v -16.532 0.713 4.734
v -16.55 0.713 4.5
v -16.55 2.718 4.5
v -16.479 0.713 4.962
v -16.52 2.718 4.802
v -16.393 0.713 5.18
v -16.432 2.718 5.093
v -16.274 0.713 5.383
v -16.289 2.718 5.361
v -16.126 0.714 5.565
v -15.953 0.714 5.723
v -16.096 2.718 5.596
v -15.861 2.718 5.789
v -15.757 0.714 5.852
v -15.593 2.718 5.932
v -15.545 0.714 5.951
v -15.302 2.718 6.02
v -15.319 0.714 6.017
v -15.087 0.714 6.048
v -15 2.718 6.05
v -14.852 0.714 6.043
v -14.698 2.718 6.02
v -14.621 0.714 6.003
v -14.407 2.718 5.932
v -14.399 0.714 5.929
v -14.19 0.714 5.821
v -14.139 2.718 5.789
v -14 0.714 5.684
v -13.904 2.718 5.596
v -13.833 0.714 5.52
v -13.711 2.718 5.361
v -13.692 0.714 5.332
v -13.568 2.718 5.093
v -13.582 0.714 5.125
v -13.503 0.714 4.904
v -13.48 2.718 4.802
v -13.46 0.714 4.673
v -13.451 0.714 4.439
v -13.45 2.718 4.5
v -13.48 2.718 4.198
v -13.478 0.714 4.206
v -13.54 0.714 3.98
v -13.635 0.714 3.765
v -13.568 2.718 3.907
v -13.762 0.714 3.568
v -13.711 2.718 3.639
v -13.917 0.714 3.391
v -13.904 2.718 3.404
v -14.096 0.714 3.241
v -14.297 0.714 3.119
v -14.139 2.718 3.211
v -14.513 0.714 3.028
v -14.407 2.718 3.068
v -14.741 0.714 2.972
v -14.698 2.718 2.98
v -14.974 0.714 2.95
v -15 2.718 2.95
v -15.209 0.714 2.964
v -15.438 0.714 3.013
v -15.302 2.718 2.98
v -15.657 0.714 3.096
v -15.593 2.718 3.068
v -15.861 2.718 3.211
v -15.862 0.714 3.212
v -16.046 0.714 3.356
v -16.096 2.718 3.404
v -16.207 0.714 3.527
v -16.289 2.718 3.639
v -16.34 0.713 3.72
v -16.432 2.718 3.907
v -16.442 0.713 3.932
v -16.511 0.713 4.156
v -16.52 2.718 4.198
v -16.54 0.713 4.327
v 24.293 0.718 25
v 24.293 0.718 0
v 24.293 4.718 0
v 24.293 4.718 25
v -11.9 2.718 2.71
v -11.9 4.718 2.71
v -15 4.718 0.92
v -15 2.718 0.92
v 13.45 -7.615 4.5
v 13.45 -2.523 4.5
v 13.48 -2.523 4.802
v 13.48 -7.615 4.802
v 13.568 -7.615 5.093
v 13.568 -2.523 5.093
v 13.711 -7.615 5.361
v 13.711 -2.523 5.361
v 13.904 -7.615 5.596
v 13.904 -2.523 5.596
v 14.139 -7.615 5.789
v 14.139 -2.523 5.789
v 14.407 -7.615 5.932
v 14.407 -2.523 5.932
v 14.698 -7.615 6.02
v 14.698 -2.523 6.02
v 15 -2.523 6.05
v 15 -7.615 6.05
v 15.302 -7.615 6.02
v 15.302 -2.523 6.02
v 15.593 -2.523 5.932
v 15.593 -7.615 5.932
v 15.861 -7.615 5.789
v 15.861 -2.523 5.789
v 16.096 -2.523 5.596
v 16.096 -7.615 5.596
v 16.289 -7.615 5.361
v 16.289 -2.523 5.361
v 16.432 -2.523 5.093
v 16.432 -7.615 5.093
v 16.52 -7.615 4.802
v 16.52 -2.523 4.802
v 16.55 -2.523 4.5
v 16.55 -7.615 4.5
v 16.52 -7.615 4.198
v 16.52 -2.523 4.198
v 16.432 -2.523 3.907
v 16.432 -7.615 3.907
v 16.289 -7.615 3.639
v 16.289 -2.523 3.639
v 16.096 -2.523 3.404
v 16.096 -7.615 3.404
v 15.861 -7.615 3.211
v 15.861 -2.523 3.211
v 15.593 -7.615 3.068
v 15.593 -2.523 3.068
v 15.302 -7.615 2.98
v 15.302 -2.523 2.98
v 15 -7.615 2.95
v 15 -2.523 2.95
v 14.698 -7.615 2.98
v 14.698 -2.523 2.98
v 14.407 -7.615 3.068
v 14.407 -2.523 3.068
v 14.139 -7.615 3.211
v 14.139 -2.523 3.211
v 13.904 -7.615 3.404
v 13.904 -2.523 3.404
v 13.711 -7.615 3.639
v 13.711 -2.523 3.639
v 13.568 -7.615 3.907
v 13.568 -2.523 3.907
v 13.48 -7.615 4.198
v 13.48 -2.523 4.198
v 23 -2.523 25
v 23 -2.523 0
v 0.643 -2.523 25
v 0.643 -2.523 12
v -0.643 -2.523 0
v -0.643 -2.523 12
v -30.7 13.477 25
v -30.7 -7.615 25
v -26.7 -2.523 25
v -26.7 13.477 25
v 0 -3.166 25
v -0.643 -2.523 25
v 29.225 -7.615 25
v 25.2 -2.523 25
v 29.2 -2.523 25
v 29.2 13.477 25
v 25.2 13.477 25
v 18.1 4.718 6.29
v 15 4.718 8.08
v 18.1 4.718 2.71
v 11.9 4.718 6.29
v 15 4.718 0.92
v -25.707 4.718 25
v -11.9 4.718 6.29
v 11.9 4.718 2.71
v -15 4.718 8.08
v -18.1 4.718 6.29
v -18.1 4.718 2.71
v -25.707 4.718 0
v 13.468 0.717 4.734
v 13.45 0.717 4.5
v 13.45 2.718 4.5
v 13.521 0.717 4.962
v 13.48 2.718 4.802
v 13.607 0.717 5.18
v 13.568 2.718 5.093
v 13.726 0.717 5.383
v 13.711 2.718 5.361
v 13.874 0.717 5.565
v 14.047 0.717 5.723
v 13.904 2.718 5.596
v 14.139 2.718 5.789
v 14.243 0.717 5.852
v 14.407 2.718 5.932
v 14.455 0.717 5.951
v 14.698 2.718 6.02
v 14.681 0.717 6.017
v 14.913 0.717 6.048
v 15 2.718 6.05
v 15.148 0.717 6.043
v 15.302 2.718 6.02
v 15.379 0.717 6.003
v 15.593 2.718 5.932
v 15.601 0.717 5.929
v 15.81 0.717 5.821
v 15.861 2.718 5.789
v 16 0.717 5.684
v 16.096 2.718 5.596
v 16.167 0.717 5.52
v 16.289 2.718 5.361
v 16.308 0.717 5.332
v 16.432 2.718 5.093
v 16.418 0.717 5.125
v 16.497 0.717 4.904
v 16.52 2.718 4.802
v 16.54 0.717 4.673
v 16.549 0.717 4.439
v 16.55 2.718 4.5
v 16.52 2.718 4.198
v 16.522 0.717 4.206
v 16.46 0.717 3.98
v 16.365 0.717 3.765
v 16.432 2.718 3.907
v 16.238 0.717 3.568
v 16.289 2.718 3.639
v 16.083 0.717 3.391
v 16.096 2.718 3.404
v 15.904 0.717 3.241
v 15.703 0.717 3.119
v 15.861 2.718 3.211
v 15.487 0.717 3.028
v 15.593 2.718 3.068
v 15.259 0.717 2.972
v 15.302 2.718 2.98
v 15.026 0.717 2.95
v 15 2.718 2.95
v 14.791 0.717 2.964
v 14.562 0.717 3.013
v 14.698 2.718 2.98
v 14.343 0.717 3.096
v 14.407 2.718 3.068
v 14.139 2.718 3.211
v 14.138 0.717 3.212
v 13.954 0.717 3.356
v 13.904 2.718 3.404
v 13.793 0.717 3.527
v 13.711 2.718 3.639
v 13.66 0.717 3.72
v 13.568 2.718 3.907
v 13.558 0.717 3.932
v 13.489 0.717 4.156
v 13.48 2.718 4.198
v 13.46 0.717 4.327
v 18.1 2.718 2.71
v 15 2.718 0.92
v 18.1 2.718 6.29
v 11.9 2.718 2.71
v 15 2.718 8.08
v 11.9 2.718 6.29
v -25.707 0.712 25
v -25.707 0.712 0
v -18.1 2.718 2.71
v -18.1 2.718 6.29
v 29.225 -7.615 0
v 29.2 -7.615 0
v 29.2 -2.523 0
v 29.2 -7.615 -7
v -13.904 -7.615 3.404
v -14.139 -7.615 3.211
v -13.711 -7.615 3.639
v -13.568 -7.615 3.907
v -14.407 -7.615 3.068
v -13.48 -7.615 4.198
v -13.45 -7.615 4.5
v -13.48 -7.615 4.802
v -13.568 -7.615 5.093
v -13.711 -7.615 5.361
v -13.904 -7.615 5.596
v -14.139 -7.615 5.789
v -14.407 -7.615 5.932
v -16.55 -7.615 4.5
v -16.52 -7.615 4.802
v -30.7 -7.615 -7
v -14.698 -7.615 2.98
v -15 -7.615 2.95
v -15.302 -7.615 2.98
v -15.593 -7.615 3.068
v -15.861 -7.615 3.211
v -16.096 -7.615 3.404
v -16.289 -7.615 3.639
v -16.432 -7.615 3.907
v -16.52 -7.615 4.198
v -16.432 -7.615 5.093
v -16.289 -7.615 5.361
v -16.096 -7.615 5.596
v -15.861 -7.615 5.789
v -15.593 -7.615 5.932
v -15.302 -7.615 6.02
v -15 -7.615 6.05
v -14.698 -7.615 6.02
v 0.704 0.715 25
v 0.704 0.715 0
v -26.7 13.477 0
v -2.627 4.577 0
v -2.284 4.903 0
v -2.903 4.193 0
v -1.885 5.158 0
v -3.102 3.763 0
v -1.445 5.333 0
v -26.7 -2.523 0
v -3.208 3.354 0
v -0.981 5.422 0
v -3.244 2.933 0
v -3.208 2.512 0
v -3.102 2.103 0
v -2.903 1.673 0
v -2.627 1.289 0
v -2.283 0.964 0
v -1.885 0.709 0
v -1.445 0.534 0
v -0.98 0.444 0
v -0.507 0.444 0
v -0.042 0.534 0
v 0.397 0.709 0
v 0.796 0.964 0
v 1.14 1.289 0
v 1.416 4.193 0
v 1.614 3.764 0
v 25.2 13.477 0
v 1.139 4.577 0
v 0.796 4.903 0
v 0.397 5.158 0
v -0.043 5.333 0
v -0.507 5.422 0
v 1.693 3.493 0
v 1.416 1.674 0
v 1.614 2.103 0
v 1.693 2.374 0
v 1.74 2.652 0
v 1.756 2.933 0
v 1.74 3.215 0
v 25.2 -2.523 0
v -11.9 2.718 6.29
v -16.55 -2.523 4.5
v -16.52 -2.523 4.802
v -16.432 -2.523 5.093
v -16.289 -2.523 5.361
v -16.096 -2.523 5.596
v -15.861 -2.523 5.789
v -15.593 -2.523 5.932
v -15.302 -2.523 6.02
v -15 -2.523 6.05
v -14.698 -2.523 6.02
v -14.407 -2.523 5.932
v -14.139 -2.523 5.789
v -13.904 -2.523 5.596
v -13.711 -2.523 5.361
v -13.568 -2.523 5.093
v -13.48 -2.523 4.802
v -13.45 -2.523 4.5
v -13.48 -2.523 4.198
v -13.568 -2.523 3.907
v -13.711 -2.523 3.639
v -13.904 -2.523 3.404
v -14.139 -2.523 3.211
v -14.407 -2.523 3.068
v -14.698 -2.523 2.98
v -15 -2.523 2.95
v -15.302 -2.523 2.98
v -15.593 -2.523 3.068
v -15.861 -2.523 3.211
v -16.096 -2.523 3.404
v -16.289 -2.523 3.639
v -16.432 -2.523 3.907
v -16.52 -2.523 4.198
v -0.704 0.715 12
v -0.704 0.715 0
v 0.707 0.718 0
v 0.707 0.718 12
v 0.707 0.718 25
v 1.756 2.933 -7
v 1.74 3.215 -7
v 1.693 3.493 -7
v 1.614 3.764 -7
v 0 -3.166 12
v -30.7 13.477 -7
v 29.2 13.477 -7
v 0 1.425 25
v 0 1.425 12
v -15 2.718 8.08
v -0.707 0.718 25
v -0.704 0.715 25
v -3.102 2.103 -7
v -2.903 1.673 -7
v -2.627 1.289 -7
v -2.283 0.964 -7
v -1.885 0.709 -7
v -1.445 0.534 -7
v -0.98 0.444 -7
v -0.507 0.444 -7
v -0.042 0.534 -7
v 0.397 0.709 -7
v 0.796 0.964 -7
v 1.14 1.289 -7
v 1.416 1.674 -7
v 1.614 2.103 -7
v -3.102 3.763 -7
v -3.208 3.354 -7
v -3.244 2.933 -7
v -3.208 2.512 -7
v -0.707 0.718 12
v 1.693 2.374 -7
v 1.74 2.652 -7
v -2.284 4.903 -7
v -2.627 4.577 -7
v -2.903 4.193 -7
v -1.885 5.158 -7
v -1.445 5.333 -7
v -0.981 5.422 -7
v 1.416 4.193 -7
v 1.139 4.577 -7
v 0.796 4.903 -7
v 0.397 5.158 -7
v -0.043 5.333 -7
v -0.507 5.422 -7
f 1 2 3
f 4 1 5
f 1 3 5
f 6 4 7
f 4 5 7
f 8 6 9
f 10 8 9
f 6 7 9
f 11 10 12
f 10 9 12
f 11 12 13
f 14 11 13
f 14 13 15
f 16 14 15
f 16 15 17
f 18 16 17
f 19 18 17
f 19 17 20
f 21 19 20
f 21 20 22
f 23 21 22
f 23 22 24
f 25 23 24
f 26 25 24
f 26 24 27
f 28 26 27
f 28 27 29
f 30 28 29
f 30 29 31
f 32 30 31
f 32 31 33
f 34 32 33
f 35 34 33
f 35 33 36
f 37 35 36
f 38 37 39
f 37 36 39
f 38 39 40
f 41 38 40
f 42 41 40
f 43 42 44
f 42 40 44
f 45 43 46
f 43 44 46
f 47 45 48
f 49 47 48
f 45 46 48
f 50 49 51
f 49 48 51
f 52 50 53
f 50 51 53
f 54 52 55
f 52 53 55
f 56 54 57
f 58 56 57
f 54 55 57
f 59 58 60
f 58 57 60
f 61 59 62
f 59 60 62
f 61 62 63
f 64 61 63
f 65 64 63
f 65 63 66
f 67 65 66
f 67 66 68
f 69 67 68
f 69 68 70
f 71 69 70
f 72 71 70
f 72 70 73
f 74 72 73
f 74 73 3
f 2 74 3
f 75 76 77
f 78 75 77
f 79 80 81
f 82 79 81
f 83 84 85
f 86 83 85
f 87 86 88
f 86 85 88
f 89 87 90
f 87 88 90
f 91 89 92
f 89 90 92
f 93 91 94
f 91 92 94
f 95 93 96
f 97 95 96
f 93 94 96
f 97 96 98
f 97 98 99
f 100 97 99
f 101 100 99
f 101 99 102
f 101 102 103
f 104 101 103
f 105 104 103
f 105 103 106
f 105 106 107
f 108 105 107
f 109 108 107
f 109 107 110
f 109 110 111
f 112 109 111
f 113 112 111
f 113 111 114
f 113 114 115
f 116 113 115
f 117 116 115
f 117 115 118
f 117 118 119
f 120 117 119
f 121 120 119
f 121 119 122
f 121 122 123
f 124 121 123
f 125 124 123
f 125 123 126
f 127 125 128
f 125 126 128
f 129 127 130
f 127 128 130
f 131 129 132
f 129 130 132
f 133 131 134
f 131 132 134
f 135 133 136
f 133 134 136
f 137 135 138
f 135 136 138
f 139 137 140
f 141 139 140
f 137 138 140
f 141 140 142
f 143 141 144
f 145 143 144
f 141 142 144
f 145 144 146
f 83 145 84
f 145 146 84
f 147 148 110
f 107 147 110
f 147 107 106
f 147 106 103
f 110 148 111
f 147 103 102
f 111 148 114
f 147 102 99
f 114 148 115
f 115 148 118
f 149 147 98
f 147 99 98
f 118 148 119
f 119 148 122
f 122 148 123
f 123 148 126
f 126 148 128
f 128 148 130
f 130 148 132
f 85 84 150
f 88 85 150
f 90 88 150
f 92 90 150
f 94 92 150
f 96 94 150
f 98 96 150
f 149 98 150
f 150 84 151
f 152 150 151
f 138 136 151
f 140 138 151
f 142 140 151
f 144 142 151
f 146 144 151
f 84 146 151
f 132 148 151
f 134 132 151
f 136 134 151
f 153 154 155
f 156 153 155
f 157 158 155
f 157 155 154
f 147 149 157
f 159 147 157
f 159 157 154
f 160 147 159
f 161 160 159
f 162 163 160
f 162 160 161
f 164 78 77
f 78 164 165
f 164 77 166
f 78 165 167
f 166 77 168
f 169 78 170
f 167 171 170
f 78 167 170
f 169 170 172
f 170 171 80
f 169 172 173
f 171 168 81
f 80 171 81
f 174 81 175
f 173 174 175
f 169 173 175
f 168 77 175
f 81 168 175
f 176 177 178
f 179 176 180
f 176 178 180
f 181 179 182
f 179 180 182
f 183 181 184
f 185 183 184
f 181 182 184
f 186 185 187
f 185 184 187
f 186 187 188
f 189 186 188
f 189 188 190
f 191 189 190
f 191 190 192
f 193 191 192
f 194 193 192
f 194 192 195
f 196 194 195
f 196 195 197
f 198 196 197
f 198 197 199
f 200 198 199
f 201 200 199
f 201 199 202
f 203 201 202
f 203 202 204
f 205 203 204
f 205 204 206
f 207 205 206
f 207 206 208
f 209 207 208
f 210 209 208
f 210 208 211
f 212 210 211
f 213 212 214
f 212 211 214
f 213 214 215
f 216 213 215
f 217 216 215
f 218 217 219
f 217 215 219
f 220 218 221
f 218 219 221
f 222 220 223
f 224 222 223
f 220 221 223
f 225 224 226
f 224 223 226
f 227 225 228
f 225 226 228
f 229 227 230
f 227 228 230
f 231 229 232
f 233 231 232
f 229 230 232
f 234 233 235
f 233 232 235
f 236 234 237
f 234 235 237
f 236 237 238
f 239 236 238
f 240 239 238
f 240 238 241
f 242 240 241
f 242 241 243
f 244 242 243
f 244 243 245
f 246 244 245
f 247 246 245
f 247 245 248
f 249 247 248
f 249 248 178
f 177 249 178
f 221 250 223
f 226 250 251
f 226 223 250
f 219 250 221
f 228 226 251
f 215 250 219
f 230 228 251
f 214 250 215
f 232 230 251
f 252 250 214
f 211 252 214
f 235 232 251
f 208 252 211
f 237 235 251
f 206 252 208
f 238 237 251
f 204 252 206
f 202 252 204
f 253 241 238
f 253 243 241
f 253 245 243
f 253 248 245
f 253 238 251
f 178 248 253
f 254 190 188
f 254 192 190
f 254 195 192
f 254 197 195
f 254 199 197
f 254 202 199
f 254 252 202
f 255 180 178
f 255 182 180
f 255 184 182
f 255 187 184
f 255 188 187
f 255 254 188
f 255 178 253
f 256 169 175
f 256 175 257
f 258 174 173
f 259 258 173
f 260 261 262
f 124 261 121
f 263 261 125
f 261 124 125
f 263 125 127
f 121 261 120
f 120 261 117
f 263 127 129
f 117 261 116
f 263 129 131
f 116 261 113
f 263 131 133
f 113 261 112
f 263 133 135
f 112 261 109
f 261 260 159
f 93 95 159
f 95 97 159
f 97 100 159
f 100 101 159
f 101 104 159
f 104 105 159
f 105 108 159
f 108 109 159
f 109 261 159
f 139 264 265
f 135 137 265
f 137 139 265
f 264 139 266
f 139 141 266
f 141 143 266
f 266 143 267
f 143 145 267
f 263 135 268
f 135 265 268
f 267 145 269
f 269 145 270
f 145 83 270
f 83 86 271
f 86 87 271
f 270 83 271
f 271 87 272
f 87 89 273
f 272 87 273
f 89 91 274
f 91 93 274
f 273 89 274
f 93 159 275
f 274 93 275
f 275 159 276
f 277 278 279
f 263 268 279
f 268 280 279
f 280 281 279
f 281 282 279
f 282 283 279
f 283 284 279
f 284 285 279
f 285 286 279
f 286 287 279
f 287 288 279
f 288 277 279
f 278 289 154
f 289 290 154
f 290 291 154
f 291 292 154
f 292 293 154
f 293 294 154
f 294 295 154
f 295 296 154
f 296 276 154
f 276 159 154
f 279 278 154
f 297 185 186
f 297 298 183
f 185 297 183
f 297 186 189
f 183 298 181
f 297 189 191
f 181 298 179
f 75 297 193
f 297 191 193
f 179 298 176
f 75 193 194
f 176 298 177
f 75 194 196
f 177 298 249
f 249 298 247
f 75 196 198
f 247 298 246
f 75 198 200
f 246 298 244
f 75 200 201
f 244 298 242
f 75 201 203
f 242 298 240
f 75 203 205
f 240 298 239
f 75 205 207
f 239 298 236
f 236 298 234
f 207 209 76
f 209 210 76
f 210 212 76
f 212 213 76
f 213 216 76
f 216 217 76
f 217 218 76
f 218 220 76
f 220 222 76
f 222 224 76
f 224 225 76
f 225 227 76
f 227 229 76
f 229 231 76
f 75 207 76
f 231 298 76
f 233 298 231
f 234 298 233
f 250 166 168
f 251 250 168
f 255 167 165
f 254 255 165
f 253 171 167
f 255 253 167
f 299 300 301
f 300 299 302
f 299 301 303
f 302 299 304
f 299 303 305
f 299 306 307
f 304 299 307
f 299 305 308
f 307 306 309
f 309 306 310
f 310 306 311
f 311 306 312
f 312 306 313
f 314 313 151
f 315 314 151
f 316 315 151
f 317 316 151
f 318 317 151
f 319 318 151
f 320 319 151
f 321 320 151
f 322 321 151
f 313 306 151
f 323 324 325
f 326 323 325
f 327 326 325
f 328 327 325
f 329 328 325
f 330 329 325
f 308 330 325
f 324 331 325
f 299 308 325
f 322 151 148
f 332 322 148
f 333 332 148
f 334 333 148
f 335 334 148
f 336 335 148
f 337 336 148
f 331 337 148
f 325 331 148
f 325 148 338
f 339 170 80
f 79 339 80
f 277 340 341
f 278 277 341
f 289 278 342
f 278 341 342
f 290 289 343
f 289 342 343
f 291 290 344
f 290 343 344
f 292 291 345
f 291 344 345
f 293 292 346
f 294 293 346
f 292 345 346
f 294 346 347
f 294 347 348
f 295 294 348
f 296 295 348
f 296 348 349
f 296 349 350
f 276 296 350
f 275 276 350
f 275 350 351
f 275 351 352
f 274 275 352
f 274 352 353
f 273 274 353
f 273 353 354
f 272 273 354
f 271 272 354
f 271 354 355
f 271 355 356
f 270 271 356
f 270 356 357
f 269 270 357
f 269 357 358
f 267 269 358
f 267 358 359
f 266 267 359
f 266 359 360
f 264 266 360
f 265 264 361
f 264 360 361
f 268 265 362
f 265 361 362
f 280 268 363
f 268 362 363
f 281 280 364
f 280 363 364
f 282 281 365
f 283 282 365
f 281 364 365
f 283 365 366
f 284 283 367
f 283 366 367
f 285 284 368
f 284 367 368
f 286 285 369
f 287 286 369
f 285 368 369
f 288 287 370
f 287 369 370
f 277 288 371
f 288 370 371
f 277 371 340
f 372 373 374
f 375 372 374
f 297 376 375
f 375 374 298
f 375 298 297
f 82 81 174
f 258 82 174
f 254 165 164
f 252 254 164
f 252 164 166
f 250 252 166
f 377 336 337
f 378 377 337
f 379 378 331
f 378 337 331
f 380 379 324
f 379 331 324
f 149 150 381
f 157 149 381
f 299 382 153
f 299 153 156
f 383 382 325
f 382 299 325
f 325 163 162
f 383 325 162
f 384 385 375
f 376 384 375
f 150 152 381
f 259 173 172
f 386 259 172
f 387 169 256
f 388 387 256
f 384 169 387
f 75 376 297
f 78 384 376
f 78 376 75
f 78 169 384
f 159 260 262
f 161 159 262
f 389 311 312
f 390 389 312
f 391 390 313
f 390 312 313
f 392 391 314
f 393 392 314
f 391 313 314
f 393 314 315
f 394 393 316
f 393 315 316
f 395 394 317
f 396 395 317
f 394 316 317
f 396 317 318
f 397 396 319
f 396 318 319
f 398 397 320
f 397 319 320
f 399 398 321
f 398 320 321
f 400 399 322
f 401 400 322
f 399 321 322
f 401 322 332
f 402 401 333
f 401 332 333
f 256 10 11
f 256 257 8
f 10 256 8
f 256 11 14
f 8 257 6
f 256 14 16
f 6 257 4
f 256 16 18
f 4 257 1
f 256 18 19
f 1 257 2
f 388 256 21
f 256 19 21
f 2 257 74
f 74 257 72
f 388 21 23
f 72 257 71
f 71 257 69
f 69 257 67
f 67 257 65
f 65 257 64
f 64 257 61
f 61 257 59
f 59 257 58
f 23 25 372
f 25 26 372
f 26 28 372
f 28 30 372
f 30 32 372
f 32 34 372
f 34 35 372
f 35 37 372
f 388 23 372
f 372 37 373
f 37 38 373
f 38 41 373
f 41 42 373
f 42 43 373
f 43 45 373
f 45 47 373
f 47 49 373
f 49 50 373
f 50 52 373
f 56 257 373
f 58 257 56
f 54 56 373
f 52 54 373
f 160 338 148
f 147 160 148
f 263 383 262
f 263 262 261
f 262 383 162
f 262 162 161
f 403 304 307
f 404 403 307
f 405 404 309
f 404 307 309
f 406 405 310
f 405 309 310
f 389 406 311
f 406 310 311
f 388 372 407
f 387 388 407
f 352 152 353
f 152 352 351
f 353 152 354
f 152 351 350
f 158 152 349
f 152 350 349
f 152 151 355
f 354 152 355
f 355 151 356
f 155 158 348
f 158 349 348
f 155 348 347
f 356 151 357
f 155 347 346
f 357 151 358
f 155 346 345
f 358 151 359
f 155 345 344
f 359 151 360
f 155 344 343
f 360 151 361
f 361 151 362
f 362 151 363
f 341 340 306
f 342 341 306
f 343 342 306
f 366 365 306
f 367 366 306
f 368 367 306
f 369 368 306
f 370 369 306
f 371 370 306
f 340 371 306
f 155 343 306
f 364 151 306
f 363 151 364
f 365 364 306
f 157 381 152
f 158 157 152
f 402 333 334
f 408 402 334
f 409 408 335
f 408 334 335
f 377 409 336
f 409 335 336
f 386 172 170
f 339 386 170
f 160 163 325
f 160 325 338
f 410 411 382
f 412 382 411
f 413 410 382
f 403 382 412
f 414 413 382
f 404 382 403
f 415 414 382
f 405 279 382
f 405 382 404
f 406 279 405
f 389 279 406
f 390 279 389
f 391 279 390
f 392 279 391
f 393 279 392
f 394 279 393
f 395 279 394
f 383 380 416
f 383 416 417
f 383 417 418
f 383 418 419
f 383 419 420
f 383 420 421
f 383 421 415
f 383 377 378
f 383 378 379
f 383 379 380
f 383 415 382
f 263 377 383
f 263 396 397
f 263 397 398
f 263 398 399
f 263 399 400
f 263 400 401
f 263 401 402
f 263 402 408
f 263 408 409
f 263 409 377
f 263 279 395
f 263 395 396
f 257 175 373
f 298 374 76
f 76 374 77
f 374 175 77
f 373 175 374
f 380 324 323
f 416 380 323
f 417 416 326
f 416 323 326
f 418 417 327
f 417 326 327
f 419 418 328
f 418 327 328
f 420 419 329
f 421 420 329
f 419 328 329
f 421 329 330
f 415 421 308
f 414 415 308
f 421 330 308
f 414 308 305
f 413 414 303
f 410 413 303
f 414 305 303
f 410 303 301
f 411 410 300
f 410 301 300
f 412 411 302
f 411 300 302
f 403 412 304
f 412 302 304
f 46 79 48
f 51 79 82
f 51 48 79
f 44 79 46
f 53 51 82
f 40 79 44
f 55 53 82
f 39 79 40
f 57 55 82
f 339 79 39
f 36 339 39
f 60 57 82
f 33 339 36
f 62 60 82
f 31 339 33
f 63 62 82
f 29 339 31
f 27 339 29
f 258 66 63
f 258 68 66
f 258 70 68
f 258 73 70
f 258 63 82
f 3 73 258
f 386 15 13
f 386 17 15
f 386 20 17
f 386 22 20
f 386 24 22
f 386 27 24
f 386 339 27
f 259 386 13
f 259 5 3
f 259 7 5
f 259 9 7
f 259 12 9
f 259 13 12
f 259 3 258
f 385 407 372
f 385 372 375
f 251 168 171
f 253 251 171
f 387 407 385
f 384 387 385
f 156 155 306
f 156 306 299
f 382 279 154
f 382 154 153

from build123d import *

# Parameters (mm, degrees)
F1_DEPTH = 25
F2_R     = 1.55
F3_DEPTH = 2
F4_DEPTH = 25
F6_DEPTH = 7
F7_DEPTH = 12


with BuildPart() as f1:
    # F0 (on Top) → F1 (new body)
    with BuildSketch(Plane.XY):
        Polygon((0, -3.165672766), (-0.6428928915, -2.5227798745), (-26.700000003, -2.5227798615), (-26.700000003, 13.4772201385), (-30.700000003, 13.4772201385), (-30.700000003, -2.5227798615), (-30.700000003, -7.615136914), (29.2246248573, -7.615136914), (29.2000018954, -2.5227798615), (29.2000018954, 13.4772201385), (25.2000018954, 13.4772201385), (25.2000018954, -2.5227798615), (23, -2.5227798745), (0.6428928915, -2.5227798745), align=None)
    extrude(amount=F1_DEPTH)


with BuildPart() as f1b:
    # F0 (on Top) → F1, piece 2 (new body)
    with BuildSketch(Plane.XY):
        Polygon((-0.7071006365, 0.7182756418), (0, 1.4253762783), (0.7071067812, 0.7182694971), (0.7043308199, 0.7154935358), (24.2928932188, 0.7182694971), (24.2928932188, 4.7182694971), (-25.7071067812, 4.7182694971), (-25.7071067812, 0.7123853715), (-0.7041527766, 0.715327782), align=None)
    extrude(amount=F1_DEPTH)

    # F2 (on face) → F3 (cut)
    with BuildSketch(Plane(origin=(0, 4.7182694971, 0), x_dir=(-1, 0, 0), z_dir=(0, 1, 0))):
        Polygon((-11.9, 2.7102141655), (-11.9, 6.2897858345), (-15, 8.079571669), (-18.1, 6.2897858345), (-18.1, 2.7102141655), (-15, 0.920428331), align=None)
        with Locations((-15, 4.5)):
            Circle(F2_R, mode=Mode.SUBTRACT)
        Polygon((11.9, 6.2897858345), (11.9, 2.7102141655), (15, 0.920428331), (18.1, 2.7102141655), (18.1, 6.2897858345), (15, 8.079571669), align=None)
        with Locations((15, 4.5)):
            Circle(F2_R, mode=Mode.SUBTRACT)
    extrude(amount=-F3_DEPTH, mode=Mode.SUBTRACT)


with BuildPart() as f4_tool:
    # F4 (cut): faces of the model
    f4_faces = [f1b.part.faces().sort_by_distance(p)[0] for p in [
        (-15, 4.7182694971, 4.5),
        (15, 4.7182694971, 4.5),
    ]]
    extrude(f4_faces, amount=-F4_DEPTH)


with BuildPart() as f1_1:
    add(f1.part)

    # F4: cut by f4_tool
    add(f4_tool.part, mode=Mode.SUBTRACT)

    # F5 (on face) → F6 (join)
    with BuildSketch(Plane(origin=(0, 0, 0), x_dir=(1, 0, 0), z_dir=(0, 0, -1))):
        with BuildLine():
            Line((-3.1019229725, -2.1028676977), (-30.700000003, 7.615136914))
            Line((-30.700000003, 7.615136914), (-30.700000003, -13.4772201385))
            Line((-30.700000003, -13.4772201385), (-3.1020298452, -3.7632462614))
            ThreePointArc((-3.1020298452, -3.7632462614), (-3.2438445731, -2.933047848), (-3.1019229725, -2.1028676977))
        make_face()
        with BuildLine():
            Line((29.2000018954, 7.615136914), (-30.700000003, 7.615136914))
            Line((-30.700000003, 7.615136914), (-3.1019229725, -2.1028676977))
            ThreePointArc((-3.1019229725, -2.1028676977), (-0.7436836622, -0.4332087692), (1.6143406887, -2.1031712668))
            Line((1.6143406887, -2.1031712668), (29.2000018954, 7.6064700878))
            Line((29.2000018954, 7.6064700878), (29.2000018954, 7.615136914))
        make_face()
        with BuildLine():
            Line((-3.1020298452, -3.7632462614), (-30.700000003, -13.4772201385))
            Line((-30.700000003, -13.4772201385), (29.2000018954, -13.4772201385))
            Line((29.2000018954, -13.4772201385), (1.614233816, -3.7635498304))
            ThreePointArc((1.614233816, -3.7635498304), (-0.7440054943, -5.4332087589), (-3.1020298452, -3.7632462614))
        make_face()
        with BuildLine():
            Line((29.2000018954, -13.4772201385), (29.2000018954, 7.6064700878))
            Line((29.2000018954, 7.6064700878), (1.6143406887, -2.1031712668))
            ThreePointArc((1.6143406887, -2.1031712668), (1.7204467161, -2.5121762043), (1.7561554217, -2.9332087641))
            ThreePointArc((1.7561554217, -2.9332087641), (1.7204196107, -3.3543999405), (1.614233816, -3.7635498304))
            Line((1.614233816, -3.7635498304), (29.2000018954, -13.4772201385))
        make_face()
    extrude(amount=F6_DEPTH)

    # F0 (on Top) → F7, piece 2 (join)
    with BuildSketch(Plane.XY):
        Polygon((0.6428928915, -2.5227798745), (-0.6428928915, -2.5227798745), (0, -3.165672766), align=None)
    extrude(amount=F7_DEPTH)


with BuildPart() as f1b_1:
    add(f1b.part)

    # F4: cut by f4_tool
    add(f4_tool.part, mode=Mode.SUBTRACT)

    # F0 (on Top) → F7 (join)
    with BuildSketch(Plane.XY):
        Polygon((0.7071067812, 0.7182694971), (0, 1.4253762783), (-0.7071006365, 0.7182756418), (-0.7041527766, 0.715327782), align=None)
    extrude(amount=F7_DEPTH)


solid = Compound([f1_1.part, f1b_1.part])
